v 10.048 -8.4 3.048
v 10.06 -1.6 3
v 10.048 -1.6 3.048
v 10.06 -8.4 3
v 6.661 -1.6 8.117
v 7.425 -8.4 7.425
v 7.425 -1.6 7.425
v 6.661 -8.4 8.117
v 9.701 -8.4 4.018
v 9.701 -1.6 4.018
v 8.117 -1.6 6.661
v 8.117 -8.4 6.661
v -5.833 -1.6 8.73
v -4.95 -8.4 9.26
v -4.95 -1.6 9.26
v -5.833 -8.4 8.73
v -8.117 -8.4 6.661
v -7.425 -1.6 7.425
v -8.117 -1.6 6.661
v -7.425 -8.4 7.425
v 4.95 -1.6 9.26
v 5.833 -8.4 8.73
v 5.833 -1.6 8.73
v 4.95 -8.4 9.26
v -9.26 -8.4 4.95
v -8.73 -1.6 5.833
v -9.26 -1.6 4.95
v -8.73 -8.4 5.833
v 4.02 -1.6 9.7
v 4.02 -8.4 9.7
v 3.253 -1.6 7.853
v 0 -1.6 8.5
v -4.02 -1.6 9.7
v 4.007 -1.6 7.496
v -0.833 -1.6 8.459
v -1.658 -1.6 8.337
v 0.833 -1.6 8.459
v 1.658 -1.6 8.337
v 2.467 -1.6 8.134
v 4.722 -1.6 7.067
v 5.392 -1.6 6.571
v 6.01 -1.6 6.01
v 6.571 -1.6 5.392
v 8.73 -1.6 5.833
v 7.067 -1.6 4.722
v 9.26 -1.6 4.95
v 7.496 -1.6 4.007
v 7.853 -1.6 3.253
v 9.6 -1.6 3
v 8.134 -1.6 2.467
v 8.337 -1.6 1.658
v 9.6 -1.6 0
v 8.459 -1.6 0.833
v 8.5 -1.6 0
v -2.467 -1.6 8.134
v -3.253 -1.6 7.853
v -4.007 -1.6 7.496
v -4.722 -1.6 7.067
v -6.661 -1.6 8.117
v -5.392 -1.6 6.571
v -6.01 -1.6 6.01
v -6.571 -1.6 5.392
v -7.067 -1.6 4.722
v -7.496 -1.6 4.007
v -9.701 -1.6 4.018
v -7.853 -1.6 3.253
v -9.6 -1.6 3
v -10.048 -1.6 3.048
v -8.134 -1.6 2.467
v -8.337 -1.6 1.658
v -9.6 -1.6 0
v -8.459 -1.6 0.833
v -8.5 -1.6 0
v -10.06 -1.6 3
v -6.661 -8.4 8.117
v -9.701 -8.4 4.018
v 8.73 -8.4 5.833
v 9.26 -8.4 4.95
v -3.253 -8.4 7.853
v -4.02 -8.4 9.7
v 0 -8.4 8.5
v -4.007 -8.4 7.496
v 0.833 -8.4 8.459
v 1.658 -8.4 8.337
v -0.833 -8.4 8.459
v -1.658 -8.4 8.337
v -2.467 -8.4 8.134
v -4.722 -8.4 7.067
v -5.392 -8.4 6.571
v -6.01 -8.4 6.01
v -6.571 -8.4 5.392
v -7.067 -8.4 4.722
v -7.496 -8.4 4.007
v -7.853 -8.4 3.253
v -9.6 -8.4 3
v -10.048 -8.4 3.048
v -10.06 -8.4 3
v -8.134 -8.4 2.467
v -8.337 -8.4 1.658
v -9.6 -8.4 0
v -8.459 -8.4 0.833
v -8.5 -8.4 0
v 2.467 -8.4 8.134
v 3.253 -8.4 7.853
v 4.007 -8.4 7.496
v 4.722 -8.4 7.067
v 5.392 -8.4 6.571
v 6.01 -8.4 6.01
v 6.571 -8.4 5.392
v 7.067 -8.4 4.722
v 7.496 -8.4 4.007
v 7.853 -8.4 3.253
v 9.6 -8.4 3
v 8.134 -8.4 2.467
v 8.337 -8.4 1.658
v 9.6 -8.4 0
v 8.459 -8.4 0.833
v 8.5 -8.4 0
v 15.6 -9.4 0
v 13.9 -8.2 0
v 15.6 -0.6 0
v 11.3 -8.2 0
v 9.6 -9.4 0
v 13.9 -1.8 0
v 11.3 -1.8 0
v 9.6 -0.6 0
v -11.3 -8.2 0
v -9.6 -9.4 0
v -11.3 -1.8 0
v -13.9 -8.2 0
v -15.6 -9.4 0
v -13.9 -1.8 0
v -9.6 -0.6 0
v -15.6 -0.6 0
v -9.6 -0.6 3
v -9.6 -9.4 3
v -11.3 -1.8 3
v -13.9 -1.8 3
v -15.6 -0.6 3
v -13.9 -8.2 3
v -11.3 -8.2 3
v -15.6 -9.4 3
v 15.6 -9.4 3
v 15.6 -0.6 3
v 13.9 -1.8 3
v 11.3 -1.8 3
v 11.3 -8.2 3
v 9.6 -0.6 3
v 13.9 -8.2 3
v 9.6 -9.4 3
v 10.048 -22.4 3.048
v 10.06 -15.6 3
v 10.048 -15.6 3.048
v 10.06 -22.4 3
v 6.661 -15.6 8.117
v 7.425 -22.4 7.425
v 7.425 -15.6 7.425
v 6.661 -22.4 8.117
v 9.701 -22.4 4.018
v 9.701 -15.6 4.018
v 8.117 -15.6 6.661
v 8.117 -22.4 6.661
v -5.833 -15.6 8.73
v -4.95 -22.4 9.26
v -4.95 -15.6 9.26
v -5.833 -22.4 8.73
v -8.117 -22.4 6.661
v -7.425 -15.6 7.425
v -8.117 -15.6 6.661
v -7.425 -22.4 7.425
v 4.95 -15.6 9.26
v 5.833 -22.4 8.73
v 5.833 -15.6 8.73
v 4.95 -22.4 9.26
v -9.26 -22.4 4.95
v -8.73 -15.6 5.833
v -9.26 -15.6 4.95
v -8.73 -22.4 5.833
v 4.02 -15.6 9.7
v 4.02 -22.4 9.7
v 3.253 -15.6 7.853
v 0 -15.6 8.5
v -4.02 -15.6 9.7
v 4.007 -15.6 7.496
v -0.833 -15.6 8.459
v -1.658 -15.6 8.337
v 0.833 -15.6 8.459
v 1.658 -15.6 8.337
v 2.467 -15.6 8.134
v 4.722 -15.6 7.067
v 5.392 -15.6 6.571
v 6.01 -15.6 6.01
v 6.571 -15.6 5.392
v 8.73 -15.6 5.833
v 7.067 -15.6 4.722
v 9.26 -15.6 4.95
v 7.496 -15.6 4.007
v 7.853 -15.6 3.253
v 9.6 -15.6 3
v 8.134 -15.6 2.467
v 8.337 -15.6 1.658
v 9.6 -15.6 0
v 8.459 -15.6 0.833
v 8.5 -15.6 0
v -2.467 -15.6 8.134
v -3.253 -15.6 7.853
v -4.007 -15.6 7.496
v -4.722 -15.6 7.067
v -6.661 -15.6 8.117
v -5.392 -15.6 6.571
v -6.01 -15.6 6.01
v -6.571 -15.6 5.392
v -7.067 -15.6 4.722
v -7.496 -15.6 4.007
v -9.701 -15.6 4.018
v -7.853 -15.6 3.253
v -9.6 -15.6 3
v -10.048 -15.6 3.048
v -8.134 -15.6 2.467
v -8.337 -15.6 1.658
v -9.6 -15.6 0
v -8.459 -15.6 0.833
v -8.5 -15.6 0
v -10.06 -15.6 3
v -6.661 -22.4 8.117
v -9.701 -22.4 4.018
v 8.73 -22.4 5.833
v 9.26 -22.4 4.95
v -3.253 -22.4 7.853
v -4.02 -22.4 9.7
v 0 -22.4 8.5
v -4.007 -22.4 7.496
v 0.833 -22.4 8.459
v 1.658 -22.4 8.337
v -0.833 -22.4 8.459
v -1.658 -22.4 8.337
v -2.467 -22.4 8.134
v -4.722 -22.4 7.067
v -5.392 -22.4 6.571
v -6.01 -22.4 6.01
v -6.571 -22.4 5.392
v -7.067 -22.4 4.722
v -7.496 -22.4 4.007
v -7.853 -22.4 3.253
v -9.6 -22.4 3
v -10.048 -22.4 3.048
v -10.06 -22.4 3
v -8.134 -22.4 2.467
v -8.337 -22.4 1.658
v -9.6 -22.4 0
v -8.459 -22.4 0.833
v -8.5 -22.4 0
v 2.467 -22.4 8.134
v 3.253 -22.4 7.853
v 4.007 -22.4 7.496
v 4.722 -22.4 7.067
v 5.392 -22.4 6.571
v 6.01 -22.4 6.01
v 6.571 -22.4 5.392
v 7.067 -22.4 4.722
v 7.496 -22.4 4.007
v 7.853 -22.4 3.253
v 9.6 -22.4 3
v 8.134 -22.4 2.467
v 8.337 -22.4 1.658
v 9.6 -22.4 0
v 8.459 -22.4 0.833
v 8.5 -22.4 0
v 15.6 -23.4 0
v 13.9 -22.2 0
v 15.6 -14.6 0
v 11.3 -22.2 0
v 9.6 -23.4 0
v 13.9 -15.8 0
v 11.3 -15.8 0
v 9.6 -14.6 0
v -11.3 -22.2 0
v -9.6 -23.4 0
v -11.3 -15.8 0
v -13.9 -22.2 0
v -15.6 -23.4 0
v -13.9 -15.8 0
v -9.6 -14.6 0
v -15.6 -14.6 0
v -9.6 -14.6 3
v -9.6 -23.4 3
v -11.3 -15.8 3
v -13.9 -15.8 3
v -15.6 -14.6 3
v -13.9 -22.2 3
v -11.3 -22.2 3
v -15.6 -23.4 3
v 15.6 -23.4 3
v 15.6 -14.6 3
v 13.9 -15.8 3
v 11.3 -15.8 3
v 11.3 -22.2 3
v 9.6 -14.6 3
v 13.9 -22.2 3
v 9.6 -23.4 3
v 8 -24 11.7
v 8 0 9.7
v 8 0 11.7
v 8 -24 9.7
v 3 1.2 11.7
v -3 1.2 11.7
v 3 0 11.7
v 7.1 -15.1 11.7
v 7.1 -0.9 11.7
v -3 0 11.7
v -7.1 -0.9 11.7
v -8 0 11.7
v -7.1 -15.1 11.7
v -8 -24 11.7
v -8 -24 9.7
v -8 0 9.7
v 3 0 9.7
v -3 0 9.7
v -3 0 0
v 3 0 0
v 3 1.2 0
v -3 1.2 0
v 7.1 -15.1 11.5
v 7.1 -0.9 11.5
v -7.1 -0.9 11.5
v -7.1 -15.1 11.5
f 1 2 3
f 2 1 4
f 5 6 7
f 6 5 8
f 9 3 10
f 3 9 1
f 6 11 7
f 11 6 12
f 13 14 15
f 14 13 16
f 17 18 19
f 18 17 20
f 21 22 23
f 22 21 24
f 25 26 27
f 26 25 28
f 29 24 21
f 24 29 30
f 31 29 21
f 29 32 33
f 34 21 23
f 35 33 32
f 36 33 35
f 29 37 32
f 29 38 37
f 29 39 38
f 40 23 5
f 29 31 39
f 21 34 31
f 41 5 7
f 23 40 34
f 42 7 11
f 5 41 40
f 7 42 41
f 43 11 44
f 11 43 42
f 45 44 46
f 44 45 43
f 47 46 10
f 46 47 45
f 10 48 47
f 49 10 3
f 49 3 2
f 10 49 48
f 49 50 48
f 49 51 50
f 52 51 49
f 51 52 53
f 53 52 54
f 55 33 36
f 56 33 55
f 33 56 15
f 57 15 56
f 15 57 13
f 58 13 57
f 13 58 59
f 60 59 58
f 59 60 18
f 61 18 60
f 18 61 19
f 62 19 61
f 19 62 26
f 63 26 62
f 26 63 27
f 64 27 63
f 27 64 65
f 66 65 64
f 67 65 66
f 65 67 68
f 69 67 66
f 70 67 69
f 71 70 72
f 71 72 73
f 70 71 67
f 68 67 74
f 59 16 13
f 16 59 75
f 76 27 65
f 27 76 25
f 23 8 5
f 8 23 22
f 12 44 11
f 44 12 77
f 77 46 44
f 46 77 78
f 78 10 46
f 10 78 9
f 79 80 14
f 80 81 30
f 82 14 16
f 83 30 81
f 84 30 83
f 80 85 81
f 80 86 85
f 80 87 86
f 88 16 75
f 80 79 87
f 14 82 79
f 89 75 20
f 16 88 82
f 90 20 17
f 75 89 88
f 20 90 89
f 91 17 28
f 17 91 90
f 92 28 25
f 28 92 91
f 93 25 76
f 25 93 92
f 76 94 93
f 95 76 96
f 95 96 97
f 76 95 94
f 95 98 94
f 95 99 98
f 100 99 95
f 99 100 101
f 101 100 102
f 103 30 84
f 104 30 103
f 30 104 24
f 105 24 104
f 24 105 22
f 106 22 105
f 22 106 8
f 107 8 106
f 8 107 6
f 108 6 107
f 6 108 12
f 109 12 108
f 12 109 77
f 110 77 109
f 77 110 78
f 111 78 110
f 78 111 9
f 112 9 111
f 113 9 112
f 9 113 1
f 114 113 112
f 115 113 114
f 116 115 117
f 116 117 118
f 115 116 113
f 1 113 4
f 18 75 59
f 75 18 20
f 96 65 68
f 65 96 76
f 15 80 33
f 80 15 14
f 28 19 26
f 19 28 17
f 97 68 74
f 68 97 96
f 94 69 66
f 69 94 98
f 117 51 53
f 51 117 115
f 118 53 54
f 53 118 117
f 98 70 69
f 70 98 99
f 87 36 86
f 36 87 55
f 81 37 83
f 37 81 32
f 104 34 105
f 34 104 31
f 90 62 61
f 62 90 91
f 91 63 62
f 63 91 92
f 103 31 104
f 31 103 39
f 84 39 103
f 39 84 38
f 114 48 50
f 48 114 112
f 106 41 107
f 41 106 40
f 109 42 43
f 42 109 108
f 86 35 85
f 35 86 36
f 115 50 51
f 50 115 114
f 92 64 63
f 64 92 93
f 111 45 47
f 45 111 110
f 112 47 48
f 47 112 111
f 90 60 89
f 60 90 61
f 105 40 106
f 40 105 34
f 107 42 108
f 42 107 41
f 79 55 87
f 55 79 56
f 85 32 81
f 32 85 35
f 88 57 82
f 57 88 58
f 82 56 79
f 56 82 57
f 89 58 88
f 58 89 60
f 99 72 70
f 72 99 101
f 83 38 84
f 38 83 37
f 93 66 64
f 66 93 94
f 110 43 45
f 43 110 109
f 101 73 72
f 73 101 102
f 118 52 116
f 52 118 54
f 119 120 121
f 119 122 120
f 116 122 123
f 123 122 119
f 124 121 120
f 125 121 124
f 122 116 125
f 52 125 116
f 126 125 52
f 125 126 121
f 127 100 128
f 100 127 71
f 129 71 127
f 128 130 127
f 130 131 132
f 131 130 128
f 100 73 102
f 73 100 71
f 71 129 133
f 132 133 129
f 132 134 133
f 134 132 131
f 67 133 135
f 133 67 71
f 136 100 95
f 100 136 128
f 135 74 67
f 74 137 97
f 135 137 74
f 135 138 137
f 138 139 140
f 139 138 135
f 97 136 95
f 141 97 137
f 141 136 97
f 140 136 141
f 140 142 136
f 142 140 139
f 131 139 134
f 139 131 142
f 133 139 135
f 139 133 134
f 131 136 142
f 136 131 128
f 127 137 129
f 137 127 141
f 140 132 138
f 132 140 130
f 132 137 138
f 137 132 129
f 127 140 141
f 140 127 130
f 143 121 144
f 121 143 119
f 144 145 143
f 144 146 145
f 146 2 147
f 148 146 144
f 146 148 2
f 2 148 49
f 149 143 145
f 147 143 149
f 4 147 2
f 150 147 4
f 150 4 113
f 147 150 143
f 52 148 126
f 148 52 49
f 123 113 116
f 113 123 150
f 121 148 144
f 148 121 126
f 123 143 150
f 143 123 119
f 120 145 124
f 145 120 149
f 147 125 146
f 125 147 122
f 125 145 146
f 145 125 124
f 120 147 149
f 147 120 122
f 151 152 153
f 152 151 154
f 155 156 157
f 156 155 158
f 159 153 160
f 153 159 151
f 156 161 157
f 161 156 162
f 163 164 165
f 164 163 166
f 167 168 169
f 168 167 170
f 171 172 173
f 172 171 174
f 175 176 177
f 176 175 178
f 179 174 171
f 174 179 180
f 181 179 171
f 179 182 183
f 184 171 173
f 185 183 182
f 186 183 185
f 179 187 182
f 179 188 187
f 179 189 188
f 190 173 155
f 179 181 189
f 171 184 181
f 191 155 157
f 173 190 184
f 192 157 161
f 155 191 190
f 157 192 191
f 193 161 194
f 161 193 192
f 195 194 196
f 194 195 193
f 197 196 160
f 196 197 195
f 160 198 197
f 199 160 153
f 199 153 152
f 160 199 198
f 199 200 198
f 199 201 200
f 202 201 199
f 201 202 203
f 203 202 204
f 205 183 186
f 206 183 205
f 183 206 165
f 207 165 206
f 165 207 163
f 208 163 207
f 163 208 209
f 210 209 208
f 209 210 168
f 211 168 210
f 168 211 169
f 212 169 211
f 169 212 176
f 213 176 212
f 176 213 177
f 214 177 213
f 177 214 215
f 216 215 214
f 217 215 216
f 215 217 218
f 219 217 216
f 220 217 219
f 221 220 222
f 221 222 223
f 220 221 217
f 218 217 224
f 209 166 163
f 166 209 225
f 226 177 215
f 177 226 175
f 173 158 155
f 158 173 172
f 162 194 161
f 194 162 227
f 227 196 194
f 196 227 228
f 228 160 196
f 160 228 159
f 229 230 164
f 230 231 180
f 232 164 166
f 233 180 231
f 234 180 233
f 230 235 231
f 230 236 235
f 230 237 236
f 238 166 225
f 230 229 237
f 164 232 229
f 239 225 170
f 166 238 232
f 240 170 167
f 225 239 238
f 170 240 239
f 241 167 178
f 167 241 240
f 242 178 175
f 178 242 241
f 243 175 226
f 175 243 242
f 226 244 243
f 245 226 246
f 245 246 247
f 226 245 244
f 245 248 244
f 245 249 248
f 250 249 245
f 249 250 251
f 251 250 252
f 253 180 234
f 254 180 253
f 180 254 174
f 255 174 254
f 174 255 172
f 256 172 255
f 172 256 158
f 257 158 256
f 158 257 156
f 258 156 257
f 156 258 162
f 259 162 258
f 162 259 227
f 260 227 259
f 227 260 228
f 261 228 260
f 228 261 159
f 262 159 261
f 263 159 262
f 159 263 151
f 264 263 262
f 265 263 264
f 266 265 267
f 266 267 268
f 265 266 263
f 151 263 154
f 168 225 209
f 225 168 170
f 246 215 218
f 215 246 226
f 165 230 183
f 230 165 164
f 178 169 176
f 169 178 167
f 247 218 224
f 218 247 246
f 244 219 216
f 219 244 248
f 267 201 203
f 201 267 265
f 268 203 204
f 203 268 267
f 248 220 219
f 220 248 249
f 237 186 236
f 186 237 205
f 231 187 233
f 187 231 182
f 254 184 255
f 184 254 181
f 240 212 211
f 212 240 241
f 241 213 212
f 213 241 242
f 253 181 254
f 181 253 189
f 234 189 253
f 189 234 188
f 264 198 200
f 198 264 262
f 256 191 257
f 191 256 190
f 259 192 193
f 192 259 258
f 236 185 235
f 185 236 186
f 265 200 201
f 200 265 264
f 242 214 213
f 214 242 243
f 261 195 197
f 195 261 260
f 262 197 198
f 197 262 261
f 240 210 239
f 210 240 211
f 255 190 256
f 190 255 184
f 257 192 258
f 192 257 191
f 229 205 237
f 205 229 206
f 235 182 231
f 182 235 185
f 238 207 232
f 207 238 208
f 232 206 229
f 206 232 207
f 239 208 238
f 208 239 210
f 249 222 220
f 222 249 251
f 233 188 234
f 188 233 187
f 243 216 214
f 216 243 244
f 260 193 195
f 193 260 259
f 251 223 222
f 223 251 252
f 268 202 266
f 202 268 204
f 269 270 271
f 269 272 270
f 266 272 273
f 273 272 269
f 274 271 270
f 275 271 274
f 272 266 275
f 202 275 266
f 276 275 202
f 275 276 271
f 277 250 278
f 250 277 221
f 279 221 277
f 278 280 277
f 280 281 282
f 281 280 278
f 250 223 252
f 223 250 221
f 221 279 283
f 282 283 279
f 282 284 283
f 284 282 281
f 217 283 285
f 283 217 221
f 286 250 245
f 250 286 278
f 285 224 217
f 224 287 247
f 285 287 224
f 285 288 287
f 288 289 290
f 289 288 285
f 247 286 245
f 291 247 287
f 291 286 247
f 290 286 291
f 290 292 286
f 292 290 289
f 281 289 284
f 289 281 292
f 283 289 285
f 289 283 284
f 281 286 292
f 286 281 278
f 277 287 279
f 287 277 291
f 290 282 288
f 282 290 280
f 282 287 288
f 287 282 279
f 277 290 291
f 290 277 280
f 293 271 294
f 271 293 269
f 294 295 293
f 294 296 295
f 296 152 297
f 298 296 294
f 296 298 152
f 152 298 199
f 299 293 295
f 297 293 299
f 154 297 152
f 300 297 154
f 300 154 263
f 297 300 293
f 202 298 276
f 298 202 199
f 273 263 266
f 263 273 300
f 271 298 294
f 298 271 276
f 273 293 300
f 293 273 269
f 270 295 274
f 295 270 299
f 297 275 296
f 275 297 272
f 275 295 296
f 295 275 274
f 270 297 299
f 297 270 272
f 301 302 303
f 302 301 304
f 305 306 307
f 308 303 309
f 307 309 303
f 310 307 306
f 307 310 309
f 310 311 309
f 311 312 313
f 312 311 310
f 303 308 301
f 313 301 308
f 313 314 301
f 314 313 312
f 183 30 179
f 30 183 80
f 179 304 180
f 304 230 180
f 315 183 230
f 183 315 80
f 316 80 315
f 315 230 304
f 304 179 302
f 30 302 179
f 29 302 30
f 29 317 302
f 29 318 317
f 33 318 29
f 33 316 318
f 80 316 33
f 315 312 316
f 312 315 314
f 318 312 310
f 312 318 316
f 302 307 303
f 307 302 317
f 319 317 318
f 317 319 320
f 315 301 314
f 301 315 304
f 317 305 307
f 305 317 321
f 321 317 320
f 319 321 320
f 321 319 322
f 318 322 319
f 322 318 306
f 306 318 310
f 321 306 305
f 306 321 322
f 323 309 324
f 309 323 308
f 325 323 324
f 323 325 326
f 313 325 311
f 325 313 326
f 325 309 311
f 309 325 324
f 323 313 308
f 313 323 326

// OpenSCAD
// ReachSense six-finger wrap v1. Units: mm. Experimental, physically unverified.
// R: +X lateral, +Y distal (towards fingertip), +Z dorsal.
// The marker deck's distal edge and the stop's inner contact face are both Y=0.
// The outer stop is Y=1.2; it is NOT the anatomical reference.
// The stop constrains Y only. Anatomical X/Z and placement repeatability are unverified.
$fn = 64;
part = "holder"; // "holder" or "strap"
marker_id = 22;
finger_diameter_mm = 17;
marker_edge_mm = 10;
quiet_zone_mm = 2;
frame_mm = 1;
wall_mm = 2;
stop_wall_mm = 1.2;
strap_width_mm = 6;
strap_length_mm = 90;

r = finger_diameter_mm/2;
tile = marker_edge_mm + 2*quiet_zone_mm;
deck_width = tile + 2*frame_mm;
length = tile + 2*frame_mm + 8;
deck_bottom = r + wall_mm - 0.8;
deck_top = deck_bottom + 2;
pocket_depth = 0.2;
marker_y = -(frame_mm + quiet_zone_mm + marker_edge_mm/2);
support_y = [-5, -length+5];

assert(finger_diameter_mm >= 12 && finger_diameter_mm <= 26, "Choose a 12–26 mm candidate opening");
assert(marker_edge_mm >= 8 && marker_edge_mm <= 16, "Choose an 8–16 mm black edge");
assert(quiet_zone_mm >= 2, "Keep the full white quiet zone");
assert(marker_id >= 0 && marker_id < 100, "DICT_4X4_100 ID required");

module support(y) {
    translate([0,y,0]) intersection() {
        difference() {
            rotate([90,0,0]) cylinder(r=r+wall_mm,h=6.8,center=true);
            rotate([90,0,0]) cylinder(r=r,h=8.8,center=true);
        }
        translate([-r-wall_mm-1,-4.4,0]) cube([2*(r+wall_mm+1),8.8,r+wall_mm+1]);
    }
    // Through-slots for 6 mm hook-and-loop strap or the optional TPU strip.
    for(sign=[-1,1]) translate([sign*(r+wall_mm+2.1),y,1.5]) difference() {
        cube([6,8.8,3],center=true);
        cube([2.6,6.4,5],center=true);
    }
}

module holder() {
    difference() {
        union() {
            for(y=support_y) support(y);
            translate([-deck_width/2,-length,deck_bottom]) cube([deck_width,length,2]);
            // Front stop contacts the fingertip at its INNER face Y=0.
            // Deck ends at Y=0 while this wall extends beyond it, preserving the reference.
            translate([-3,0,0]) cube([6,stop_wall_mm,deck_top]);
        }
        // Shallow square registration recess. Keep all 2 mm white margins visible.
        translate([-tile/2-0.1,marker_y-tile/2-0.1,deck_top-pocket_depth])
            cube([tile+0.2,tile+0.2,pocket_depth+1]);
        // Identity comes from the attached printed marker. Geometry is shared by size.
    }
}

module strap() {
    // TPU-only ladder strip. Its ends need a return loop/fastener or hook-and-loop tape.
    // This is not an articulated hard-plastic chain or a validated locking buckle.
    union() {
        translate([-strap_length_mm/2,-strap_width_mm/2,0])
            cube([strap_length_mm,strap_width_mm,0.8]);
        for(x=[-strap_length_mm/2+3:4:strap_length_mm/2-3])
            translate([x-0.7,-strap_width_mm/2,0.8]) cube([1.4,strap_width_mm,0.5]);
    }
}

if(part == "strap") strap(); else holder();
echo(reference_plane_y_mm=0, outer_stop_y_mm=stop_wall_mm);
echo(marker_center_R_mm=[0,marker_y,deck_top-pocket_depth+0.15]);
echo(marker_center_to_distal_deck_edge_mm=-marker_y);
